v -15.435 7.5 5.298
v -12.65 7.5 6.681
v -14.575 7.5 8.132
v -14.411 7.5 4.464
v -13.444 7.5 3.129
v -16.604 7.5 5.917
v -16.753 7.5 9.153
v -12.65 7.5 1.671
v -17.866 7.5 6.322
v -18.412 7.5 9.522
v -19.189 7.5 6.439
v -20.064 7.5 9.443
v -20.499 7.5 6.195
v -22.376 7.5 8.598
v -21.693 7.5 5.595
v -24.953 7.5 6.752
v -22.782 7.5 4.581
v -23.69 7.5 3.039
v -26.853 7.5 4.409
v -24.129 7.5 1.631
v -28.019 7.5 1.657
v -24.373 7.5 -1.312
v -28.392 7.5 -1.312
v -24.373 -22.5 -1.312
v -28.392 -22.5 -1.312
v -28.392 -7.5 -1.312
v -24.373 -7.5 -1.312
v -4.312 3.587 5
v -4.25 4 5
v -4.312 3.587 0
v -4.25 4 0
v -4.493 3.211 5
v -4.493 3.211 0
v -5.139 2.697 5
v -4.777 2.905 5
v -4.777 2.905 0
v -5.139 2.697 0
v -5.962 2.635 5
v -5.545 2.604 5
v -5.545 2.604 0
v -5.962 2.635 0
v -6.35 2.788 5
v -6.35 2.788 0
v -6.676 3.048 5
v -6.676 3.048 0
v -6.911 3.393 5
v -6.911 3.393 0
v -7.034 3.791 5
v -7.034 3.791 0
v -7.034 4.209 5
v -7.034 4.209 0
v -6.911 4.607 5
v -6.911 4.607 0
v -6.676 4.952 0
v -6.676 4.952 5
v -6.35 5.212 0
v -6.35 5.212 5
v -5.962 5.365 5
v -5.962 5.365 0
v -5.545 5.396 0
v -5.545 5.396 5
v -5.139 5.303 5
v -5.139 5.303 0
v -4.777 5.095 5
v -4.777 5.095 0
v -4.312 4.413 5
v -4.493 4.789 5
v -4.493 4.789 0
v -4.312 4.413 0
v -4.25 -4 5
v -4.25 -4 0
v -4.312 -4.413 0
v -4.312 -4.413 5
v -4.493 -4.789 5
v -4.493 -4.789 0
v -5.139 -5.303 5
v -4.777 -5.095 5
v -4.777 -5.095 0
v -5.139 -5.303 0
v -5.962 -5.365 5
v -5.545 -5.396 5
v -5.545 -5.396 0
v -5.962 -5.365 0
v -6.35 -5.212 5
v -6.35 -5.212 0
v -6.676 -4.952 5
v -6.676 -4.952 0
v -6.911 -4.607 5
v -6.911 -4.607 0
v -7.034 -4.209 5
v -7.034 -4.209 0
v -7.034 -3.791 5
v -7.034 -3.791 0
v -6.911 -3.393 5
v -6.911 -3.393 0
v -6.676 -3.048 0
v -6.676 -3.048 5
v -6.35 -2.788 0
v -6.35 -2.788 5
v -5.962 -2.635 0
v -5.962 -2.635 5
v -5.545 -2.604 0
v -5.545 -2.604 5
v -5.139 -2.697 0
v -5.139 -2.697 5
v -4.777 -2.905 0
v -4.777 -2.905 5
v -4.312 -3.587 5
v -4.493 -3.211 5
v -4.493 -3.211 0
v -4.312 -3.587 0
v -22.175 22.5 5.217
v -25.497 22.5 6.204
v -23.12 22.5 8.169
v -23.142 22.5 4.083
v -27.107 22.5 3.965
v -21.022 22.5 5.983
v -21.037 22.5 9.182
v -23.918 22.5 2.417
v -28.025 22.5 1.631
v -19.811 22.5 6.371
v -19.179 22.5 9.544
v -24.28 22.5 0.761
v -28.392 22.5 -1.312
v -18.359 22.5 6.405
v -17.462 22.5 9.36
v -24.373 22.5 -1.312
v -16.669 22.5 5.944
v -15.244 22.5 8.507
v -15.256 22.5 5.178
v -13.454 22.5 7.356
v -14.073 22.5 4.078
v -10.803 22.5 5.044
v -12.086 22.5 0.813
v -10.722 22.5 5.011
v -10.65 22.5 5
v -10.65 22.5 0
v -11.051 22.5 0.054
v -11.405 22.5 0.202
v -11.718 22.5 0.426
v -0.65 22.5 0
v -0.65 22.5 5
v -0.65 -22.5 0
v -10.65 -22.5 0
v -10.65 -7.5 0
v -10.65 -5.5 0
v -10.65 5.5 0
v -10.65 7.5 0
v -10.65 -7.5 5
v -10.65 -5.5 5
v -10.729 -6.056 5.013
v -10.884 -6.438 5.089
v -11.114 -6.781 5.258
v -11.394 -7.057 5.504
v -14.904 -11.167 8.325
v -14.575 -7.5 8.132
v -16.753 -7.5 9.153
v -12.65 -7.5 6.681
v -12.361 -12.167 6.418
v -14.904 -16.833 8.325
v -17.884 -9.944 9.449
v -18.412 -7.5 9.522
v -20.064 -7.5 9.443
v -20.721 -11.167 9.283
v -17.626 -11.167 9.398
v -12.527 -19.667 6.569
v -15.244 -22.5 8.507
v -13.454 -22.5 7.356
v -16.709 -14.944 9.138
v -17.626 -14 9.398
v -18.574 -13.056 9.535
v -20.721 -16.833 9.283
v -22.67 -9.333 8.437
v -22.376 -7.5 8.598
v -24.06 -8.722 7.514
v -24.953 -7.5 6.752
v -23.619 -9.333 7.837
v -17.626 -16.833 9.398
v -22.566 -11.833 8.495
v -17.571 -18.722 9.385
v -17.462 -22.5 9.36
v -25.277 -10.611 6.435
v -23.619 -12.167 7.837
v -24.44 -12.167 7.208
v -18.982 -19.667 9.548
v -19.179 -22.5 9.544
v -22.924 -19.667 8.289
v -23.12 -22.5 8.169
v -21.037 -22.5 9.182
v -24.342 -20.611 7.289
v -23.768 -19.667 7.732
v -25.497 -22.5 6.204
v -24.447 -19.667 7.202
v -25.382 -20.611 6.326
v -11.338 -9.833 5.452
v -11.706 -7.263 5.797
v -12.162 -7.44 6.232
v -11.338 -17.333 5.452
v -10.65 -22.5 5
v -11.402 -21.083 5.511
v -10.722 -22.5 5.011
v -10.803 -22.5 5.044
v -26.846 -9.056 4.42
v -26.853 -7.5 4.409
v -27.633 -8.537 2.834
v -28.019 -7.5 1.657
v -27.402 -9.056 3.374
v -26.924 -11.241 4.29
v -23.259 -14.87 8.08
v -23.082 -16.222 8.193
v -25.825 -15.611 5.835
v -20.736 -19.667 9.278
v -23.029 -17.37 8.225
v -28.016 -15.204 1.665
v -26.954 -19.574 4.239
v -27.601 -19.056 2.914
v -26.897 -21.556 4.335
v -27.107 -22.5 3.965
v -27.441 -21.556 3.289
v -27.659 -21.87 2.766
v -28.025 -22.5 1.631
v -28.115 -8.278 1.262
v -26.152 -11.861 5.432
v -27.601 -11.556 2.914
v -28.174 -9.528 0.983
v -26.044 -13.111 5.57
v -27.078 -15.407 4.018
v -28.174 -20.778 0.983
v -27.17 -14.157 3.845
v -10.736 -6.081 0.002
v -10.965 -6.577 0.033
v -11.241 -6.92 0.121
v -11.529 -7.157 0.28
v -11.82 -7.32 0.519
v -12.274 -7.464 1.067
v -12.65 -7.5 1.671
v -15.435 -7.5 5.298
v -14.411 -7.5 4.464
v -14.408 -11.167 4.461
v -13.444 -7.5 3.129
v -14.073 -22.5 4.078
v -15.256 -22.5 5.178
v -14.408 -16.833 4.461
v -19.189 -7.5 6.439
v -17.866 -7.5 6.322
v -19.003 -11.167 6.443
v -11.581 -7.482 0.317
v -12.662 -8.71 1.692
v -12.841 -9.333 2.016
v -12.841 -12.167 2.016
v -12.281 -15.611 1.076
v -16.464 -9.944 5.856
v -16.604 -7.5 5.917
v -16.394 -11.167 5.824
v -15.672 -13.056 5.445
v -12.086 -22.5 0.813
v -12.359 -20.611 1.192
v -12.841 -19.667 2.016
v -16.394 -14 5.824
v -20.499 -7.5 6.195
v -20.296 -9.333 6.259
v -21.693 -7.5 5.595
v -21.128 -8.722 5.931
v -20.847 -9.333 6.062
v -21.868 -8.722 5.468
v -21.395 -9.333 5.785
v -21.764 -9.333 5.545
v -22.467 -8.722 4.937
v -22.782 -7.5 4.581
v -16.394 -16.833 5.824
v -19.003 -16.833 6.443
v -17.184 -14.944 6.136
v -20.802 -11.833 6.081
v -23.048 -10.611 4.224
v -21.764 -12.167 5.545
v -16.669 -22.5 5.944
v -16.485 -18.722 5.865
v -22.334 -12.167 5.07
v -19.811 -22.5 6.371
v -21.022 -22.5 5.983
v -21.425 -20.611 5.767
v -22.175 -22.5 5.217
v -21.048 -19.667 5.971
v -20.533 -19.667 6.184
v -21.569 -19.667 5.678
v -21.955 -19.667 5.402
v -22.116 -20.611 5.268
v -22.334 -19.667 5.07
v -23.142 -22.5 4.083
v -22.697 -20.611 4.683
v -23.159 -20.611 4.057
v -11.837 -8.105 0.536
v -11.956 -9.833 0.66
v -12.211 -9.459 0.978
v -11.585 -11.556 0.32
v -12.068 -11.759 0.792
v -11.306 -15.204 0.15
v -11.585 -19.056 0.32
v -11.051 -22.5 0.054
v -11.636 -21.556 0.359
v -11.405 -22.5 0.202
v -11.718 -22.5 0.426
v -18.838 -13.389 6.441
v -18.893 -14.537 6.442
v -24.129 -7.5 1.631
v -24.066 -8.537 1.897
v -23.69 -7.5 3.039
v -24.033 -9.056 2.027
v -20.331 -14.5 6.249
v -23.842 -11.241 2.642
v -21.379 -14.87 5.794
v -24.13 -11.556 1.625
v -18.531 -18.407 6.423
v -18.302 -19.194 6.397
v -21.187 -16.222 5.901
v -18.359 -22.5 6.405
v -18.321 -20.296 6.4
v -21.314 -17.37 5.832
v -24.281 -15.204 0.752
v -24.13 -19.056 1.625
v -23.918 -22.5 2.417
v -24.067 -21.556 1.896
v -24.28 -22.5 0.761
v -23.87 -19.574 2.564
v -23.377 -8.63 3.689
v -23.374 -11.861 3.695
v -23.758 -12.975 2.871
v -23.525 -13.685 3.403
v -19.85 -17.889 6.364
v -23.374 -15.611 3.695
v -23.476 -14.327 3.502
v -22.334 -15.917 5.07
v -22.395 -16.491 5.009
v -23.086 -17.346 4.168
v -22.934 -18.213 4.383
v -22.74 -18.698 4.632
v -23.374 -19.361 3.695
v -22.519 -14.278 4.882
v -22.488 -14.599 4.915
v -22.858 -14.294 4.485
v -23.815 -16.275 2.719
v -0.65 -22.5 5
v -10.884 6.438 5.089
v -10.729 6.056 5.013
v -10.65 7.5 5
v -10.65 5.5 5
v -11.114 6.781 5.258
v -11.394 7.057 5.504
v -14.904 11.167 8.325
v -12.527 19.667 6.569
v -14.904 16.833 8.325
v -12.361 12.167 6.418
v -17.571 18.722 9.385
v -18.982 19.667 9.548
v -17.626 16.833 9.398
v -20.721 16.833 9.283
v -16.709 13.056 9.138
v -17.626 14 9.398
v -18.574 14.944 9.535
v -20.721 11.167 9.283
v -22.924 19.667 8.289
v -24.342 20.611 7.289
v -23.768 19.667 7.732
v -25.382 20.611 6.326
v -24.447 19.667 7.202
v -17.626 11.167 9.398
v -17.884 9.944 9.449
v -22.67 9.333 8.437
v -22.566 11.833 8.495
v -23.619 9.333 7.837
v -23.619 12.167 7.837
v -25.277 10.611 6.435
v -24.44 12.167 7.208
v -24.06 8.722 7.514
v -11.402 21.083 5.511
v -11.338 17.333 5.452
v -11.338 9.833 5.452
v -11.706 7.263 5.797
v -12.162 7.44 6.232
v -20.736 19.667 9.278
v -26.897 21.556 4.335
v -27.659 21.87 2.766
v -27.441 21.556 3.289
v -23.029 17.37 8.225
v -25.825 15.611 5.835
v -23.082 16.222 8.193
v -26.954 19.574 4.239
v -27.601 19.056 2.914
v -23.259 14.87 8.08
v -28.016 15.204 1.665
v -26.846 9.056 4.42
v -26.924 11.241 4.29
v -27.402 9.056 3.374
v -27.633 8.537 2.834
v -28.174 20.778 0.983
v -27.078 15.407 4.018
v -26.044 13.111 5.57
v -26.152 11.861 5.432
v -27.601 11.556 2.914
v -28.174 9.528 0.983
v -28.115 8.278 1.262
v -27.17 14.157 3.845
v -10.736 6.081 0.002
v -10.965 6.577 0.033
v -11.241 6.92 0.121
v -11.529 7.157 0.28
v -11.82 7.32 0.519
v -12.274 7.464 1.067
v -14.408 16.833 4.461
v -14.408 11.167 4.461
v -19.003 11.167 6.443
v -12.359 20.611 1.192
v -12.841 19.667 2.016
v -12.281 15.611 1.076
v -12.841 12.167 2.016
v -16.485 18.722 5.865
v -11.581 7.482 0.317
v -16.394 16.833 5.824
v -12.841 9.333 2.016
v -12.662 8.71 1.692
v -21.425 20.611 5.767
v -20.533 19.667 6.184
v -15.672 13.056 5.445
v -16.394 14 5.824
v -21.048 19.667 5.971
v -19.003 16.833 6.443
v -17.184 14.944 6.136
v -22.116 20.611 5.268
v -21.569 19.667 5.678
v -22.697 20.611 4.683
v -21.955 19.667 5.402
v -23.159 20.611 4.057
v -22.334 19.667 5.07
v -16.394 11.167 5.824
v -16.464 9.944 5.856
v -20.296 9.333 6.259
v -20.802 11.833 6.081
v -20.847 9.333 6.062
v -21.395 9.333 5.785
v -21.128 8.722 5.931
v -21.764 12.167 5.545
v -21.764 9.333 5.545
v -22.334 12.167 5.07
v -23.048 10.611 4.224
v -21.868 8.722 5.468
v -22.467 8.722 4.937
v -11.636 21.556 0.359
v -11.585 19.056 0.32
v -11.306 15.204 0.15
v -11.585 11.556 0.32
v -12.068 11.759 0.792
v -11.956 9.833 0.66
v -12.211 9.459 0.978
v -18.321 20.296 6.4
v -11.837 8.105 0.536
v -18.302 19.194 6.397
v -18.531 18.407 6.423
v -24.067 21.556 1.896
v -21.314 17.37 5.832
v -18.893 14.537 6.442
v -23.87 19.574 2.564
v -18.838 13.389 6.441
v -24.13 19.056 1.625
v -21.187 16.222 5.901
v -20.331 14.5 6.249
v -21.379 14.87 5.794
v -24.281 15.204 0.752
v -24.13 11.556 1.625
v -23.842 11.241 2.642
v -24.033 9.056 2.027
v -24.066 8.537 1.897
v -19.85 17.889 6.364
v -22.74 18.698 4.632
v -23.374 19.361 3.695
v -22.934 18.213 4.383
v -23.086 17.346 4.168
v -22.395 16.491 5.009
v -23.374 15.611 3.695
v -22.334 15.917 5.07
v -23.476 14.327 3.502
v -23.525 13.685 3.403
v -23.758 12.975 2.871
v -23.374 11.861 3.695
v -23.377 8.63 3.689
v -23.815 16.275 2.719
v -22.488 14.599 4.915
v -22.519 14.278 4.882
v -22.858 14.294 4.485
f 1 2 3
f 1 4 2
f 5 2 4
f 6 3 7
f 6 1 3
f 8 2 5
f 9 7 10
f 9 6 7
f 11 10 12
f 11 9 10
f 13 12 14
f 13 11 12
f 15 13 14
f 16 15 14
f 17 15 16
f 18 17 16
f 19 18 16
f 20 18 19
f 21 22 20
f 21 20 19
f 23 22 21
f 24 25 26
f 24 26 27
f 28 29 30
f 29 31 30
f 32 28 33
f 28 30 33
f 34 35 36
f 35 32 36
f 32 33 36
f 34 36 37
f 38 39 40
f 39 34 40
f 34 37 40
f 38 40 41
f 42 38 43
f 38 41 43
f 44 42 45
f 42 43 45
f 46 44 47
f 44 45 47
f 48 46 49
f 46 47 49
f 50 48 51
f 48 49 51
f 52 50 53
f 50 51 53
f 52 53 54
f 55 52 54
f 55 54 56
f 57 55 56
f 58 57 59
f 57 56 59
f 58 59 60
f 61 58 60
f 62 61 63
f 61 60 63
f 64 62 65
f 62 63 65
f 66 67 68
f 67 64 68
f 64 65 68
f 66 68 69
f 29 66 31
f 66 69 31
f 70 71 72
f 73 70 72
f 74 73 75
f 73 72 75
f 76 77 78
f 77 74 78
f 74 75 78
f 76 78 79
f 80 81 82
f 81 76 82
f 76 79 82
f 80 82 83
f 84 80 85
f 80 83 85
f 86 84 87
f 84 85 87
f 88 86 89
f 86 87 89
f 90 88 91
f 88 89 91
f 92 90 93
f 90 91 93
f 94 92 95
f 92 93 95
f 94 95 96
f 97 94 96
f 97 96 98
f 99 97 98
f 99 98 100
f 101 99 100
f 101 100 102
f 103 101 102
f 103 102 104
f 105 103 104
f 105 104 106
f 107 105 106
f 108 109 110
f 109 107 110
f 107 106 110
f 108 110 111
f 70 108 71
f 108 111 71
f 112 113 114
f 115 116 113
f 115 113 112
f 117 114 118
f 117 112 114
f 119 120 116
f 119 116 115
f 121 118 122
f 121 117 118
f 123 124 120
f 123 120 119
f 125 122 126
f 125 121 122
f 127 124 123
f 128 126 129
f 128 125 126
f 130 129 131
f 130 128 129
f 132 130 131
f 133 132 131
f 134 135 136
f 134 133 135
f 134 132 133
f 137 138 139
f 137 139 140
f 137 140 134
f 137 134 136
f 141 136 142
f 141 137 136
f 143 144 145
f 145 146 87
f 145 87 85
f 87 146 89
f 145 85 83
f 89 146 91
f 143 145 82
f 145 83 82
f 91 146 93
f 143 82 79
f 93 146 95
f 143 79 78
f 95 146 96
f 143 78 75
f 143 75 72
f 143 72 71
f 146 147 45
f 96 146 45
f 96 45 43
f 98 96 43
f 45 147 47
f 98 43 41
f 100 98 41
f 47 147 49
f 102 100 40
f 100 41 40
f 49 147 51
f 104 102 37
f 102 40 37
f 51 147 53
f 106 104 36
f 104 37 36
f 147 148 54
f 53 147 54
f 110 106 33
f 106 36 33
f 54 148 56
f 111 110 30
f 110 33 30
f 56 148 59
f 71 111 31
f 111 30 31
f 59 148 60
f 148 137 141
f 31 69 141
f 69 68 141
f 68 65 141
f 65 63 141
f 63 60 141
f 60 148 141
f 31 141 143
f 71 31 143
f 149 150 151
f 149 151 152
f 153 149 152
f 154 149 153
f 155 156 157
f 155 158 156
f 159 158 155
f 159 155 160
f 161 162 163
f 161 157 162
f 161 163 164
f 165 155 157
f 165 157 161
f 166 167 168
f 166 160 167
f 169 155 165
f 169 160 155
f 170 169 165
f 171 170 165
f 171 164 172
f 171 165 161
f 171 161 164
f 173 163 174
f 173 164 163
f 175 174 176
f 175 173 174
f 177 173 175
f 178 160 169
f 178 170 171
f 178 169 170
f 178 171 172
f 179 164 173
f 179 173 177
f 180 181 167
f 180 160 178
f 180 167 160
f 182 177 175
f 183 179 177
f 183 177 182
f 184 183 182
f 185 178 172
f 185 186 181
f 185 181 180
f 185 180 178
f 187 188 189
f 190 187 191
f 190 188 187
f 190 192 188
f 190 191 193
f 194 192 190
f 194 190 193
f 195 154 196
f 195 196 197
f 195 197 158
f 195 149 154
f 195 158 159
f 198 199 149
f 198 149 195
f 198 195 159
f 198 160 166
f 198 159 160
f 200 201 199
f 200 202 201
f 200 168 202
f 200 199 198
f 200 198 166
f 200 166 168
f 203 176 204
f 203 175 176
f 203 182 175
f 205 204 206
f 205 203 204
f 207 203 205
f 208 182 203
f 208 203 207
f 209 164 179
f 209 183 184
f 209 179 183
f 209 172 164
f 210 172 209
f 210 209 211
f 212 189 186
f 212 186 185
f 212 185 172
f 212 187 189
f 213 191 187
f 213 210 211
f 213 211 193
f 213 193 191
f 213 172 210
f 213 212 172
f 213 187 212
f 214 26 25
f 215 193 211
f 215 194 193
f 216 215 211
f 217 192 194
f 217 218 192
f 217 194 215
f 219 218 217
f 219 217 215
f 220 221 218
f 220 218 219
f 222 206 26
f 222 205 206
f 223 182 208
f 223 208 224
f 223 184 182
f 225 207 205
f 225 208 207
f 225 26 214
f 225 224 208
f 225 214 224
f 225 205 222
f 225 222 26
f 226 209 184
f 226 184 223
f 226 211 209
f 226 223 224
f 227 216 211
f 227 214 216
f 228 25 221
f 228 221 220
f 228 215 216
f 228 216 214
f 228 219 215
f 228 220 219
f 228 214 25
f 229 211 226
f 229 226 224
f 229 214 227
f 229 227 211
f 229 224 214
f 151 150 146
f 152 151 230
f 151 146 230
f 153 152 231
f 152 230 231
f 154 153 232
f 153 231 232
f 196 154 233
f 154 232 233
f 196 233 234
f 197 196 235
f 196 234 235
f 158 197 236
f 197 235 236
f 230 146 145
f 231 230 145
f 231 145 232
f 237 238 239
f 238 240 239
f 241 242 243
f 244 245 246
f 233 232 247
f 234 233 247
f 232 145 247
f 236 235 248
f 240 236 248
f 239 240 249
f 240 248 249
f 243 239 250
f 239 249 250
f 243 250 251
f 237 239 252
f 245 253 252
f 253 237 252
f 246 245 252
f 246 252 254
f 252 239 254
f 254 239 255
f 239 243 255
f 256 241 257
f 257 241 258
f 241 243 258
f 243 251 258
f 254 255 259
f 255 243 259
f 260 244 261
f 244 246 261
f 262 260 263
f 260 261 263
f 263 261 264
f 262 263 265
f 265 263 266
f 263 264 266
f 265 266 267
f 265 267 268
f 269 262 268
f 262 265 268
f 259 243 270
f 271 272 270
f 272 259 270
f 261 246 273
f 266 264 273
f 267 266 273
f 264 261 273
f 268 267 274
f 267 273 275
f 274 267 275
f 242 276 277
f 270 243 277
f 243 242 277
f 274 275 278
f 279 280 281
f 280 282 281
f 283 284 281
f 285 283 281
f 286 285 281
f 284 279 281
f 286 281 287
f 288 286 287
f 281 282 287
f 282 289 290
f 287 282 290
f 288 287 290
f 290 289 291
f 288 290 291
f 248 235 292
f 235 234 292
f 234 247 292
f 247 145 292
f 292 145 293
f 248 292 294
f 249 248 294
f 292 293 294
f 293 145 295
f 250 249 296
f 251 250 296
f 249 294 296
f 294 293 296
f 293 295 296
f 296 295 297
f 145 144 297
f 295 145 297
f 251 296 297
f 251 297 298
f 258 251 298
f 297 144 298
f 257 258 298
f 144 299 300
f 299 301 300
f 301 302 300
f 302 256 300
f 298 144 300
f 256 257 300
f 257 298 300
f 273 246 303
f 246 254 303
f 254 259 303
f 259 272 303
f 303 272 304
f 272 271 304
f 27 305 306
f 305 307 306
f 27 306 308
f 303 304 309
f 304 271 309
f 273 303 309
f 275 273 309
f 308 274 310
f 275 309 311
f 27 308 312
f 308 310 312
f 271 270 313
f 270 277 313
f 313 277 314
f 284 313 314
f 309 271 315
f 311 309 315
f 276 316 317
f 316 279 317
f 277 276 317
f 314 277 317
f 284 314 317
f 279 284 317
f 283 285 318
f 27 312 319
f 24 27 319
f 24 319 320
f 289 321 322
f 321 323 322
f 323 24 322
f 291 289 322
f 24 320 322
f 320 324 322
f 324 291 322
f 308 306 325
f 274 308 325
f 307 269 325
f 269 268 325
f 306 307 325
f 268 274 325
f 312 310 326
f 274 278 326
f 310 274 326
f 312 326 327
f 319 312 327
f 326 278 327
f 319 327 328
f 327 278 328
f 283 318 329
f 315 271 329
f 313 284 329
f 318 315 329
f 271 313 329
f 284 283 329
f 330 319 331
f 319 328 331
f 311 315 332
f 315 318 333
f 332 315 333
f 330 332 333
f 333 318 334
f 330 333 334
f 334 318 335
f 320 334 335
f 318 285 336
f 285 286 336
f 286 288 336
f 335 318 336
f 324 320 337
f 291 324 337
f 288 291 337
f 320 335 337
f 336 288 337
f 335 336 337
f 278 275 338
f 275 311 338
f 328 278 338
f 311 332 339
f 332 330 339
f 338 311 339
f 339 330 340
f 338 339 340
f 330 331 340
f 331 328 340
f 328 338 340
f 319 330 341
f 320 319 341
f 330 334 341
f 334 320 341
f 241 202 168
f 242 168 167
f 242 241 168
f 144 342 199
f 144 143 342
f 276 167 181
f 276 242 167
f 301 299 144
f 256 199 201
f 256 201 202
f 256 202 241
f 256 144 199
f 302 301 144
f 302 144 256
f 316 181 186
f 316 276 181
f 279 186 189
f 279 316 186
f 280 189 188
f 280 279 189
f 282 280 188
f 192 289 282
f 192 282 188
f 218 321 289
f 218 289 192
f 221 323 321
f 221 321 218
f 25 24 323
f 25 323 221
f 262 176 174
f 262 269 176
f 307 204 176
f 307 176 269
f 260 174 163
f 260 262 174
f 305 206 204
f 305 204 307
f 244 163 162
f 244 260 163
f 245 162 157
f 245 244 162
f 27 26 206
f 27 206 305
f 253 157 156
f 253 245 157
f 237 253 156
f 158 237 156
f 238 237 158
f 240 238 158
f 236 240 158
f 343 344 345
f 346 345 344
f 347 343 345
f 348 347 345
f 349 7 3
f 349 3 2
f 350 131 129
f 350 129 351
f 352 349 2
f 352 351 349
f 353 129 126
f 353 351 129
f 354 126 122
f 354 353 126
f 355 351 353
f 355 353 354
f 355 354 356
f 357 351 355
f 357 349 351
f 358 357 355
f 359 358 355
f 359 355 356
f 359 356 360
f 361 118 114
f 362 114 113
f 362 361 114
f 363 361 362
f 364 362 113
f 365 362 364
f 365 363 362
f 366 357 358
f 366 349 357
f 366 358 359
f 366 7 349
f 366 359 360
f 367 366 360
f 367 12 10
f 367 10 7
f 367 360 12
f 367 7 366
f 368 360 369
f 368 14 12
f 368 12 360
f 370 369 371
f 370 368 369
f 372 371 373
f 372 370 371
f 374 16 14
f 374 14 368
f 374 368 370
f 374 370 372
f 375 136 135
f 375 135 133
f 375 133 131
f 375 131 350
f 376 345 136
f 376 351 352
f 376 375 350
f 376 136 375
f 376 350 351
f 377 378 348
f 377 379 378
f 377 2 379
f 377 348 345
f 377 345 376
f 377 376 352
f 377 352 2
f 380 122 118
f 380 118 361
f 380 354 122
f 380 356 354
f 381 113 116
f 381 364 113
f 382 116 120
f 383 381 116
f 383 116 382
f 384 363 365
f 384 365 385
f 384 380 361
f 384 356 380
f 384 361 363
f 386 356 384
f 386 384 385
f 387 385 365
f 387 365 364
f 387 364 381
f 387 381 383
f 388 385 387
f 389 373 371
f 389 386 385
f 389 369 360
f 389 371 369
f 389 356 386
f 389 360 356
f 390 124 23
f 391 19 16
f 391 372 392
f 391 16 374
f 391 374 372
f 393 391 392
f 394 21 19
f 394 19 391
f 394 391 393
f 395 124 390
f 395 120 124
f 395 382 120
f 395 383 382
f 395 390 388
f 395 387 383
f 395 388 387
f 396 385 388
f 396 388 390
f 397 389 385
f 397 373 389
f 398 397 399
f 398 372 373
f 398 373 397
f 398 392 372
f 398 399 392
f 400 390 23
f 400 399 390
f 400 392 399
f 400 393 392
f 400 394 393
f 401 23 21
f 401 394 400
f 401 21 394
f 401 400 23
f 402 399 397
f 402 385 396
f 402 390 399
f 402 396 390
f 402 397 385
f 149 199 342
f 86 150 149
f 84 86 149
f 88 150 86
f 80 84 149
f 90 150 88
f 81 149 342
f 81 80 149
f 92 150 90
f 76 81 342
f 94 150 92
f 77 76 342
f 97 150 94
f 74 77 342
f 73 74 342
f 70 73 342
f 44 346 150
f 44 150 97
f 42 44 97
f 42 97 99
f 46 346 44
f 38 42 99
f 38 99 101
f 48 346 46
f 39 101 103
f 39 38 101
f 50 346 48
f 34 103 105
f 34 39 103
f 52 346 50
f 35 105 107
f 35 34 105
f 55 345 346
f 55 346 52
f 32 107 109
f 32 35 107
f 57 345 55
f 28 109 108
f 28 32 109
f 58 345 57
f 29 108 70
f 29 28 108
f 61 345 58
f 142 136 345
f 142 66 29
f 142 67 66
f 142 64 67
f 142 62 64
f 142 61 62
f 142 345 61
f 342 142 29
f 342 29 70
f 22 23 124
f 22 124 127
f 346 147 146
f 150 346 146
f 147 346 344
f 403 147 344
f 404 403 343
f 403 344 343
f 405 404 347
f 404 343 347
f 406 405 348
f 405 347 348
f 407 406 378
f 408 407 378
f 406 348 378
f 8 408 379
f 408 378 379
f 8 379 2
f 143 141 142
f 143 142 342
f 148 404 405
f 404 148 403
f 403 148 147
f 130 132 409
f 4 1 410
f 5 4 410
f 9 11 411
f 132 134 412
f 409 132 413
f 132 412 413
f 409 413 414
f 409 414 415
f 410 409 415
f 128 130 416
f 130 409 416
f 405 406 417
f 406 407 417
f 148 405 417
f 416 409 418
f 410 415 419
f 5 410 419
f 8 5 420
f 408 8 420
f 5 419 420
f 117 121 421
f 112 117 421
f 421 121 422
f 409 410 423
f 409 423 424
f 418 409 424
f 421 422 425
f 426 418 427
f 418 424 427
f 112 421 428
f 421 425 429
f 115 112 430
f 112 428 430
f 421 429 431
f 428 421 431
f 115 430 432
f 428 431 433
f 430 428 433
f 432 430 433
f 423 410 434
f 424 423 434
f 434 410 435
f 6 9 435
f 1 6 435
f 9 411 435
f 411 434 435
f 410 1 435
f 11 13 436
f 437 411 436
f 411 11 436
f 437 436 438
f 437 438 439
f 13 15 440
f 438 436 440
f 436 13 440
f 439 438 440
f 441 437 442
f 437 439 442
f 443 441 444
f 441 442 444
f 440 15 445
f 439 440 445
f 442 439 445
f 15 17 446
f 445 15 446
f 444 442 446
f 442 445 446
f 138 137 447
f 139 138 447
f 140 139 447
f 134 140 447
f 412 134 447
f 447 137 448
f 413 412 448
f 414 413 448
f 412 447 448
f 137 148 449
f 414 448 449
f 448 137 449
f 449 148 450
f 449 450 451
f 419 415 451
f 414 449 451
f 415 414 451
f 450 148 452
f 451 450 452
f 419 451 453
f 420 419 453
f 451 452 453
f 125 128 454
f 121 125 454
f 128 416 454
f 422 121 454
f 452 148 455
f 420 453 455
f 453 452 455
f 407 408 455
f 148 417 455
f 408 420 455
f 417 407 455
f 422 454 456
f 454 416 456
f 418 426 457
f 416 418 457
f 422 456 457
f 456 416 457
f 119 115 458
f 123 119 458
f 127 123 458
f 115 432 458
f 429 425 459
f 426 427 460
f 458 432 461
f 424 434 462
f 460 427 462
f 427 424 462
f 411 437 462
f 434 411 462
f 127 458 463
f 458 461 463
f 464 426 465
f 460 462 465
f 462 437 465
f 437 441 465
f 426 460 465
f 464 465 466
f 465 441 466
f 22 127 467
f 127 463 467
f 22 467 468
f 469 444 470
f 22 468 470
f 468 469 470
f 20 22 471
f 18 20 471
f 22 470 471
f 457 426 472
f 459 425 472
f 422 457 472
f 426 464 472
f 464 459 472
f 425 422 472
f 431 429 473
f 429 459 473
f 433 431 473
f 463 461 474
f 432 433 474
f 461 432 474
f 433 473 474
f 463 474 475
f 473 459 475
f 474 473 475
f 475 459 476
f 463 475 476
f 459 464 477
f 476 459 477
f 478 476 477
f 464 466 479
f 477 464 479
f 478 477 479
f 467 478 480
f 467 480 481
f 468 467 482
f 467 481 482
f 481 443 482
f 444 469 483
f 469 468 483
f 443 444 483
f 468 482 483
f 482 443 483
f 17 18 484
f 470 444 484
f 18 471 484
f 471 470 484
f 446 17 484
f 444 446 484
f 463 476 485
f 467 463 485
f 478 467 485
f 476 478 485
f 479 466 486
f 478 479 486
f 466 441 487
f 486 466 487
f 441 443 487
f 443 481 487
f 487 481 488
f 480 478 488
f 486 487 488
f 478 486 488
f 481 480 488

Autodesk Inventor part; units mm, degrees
ref_plane "YZ Plane" through (0, 0, 0) normal (1, 0, 0) x (0, 1, 0)
ref_plane "XZ Plane" through (0, 0, 0) normal (0, 1, 0) x (-1, 0, 0)
ref_plane "XY Plane" through (0, 0, 0) normal (0, 0, 1) x (1, 0, 0)
sketch "Skizze1" plane through (0, 0, 0) normal (0, 0, 1) x (1, 0, 0)
  circle A0 centre (-16.6663, 54.3) radius 1.65 projected
  circle A1 centre (-5.6501, 4) radius 1.4 projected
  circle A2 centre (-5.6501, -4) radius 1.4 projected
  circle A3 centre (-16.9417, 18.1) radius 1.65 projected
  line L0 (-0.6501, -22.5) -> (-10.6501, -22.5)
  line L1 (-10.6501, -22.5) -> (-10.6501, 22.5)
  line L2 (-10.6501, 22.5) -> (-0.6501, 22.5)
  line L3 (-0.6501, 22.5) -> (-0.6501, -22.5)
  line L4 (-0.6501, -22.5) -> (-10.6501, 22.5) construction
  line L5 (-10.6501, -22.5) -> (-0.6501, 22.5) construction
  point P0 (0, 0)
  point P1 (-5.6501, 0)
  dimension "d0" = 10
  dimension "d1" = 45
extrude "Extrusion1" add sketch "Skizze1" along normal blind 5 contours L0 L1 L2 L3
sketch "Skizze2" plane through (-10.6501, -22.5, 0) normal (0, -1, 0) x (1, 0, 0)
  line L0 (0, 0) -> (10, 0) projected
  line L1 (10, 0) -> (10, 5) projected
  line L2 (0, 5) -> (10, 5) projected
  line L3 (0, 0) -> (0, 5) projected
  line L4 (0, 0) -> (-1.6429, 0) construction
  line L5 (-1.6429, 0) -> (-2.7402, 4.5123) construction
  line L6 (-2.7402, 4.5123) -> (-5.3021, 5.5945) construction
  line L7 (-5.3021, 5.5945) -> (-9.43, 7.7902) construction
  line L8 (-9.43, 7.7902) -> (-13.8799, 3.8379) construction
  line L9 (-13.8799, 3.8379) -> (-13.7228, -1.3116) construction
  spline S0 degree 4 poles (0, 0) (-1.6429, 0) (-2.7402, 4.5123) (-5.3021, 5.5945) (-9.43, 7.7902) (-13.8799, 3.8379) (-13.7228, -1.3116) knots 1 1 1 1 1 2 3 4 4 4 4 4
  line L10 (0, 5) -> (-0.4655, 5) construction
  line L11 (-0.4655, 5) -> (-2.7402, 8.0244) construction
  line L12 (-2.7402, 8.0244) -> (-7.1757, 9.8395) construction
  line L13 (-7.1757, 9.8395) -> (-10.7181, 10.2483) construction
  line L14 (-10.7181, 10.2483) -> (-17.7424, 4.5123) construction
  line L15 (-17.7424, 4.5123) -> (-17.7424, -1.3116) construction
  spline S1 degree 4 poles (0, 5) (-0.4655, 5) (-2.7402, 8.0244) (-7.1757, 9.8395) (-10.7181, 10.2483) (-17.7424, 4.5123) (-17.7424, -1.3116) knots 1 1 1 1 1 2 3 4 4 4 4 4
  line L16 (-17.7424, -1.3116) -> (-13.7228, -1.3116)
  point P0 (10.6501, 0)
extrude "Extrusion2" add sketch "Skizze2" against normal up to surface (45 mm away) contours S0 L16 S1 L3
sketch "Skizze3" plane through (0, 0, 5) normal (0, 0, 1) x (1, 0, 0)
  line L0 (-0.6501, 22.5) -> (-10.6501, 22.5) projected
  line L1 (-10.6501, 22.5) -> (-10.6501, -22.5) projected
  line L2 (-10.6501, -22.5) -> (-0.6501, -22.5) projected
  line L3 (-0.6501, -22.5) -> (-0.6501, 22.5) projected
  circle A0 centre (-5.6501, -4) radius 1.4 projected
  circle A1 centre (-5.6501, 4) radius 1.4 projected
  line L4 (-42.8998, -7.5) -> (-10.6501, -7.5)
  line L5 (-10.6501, -7.5) -> (-10.6501, 7.5)
  line L6 (-10.6501, 7.5) -> (-42.8998, 7.5)
  line L7 (-42.8998, 7.5) -> (-42.8998, -7.5)
  line L8 (-42.8998, -7.5) -> (-10.6501, 7.5) construction
  line L9 (-10.6501, -7.5) -> (-42.8998, 7.5) construction
  line L10 (-10.6501, 22.5) -> (-42.8998, 7.5)
  line L11 (-42.8998, -7.5) -> (-10.6501, -22.5)
  line L12 (-42.8998, 22.5) -> (-10.6501, 22.5)
  line L13 (-10.6501, 22.5) -> (-10.6501, -22.5)
  line L14 (-10.6501, -22.5) -> (-42.8998, -22.5)
  line L15 (-42.8998, -22.5) -> (-42.8998, 22.5)
  point P0 (0, 0)
  point P1 (-26.775, 0)
  point P2 (-10.6501, -7.5)
  dimension "d6" = 15
extrude "Extrusion3" cut sketch "Skizze3" along normal through all both and the other way through all contours L1 L4 L7 L6
fillet "Rundung1" radius 2 2 edges at (-10.6501, 7.5, 2.5) (-10.6501, -7.5, 2.5)
properties part number "60_Planktoscope_Sampleclamp"
